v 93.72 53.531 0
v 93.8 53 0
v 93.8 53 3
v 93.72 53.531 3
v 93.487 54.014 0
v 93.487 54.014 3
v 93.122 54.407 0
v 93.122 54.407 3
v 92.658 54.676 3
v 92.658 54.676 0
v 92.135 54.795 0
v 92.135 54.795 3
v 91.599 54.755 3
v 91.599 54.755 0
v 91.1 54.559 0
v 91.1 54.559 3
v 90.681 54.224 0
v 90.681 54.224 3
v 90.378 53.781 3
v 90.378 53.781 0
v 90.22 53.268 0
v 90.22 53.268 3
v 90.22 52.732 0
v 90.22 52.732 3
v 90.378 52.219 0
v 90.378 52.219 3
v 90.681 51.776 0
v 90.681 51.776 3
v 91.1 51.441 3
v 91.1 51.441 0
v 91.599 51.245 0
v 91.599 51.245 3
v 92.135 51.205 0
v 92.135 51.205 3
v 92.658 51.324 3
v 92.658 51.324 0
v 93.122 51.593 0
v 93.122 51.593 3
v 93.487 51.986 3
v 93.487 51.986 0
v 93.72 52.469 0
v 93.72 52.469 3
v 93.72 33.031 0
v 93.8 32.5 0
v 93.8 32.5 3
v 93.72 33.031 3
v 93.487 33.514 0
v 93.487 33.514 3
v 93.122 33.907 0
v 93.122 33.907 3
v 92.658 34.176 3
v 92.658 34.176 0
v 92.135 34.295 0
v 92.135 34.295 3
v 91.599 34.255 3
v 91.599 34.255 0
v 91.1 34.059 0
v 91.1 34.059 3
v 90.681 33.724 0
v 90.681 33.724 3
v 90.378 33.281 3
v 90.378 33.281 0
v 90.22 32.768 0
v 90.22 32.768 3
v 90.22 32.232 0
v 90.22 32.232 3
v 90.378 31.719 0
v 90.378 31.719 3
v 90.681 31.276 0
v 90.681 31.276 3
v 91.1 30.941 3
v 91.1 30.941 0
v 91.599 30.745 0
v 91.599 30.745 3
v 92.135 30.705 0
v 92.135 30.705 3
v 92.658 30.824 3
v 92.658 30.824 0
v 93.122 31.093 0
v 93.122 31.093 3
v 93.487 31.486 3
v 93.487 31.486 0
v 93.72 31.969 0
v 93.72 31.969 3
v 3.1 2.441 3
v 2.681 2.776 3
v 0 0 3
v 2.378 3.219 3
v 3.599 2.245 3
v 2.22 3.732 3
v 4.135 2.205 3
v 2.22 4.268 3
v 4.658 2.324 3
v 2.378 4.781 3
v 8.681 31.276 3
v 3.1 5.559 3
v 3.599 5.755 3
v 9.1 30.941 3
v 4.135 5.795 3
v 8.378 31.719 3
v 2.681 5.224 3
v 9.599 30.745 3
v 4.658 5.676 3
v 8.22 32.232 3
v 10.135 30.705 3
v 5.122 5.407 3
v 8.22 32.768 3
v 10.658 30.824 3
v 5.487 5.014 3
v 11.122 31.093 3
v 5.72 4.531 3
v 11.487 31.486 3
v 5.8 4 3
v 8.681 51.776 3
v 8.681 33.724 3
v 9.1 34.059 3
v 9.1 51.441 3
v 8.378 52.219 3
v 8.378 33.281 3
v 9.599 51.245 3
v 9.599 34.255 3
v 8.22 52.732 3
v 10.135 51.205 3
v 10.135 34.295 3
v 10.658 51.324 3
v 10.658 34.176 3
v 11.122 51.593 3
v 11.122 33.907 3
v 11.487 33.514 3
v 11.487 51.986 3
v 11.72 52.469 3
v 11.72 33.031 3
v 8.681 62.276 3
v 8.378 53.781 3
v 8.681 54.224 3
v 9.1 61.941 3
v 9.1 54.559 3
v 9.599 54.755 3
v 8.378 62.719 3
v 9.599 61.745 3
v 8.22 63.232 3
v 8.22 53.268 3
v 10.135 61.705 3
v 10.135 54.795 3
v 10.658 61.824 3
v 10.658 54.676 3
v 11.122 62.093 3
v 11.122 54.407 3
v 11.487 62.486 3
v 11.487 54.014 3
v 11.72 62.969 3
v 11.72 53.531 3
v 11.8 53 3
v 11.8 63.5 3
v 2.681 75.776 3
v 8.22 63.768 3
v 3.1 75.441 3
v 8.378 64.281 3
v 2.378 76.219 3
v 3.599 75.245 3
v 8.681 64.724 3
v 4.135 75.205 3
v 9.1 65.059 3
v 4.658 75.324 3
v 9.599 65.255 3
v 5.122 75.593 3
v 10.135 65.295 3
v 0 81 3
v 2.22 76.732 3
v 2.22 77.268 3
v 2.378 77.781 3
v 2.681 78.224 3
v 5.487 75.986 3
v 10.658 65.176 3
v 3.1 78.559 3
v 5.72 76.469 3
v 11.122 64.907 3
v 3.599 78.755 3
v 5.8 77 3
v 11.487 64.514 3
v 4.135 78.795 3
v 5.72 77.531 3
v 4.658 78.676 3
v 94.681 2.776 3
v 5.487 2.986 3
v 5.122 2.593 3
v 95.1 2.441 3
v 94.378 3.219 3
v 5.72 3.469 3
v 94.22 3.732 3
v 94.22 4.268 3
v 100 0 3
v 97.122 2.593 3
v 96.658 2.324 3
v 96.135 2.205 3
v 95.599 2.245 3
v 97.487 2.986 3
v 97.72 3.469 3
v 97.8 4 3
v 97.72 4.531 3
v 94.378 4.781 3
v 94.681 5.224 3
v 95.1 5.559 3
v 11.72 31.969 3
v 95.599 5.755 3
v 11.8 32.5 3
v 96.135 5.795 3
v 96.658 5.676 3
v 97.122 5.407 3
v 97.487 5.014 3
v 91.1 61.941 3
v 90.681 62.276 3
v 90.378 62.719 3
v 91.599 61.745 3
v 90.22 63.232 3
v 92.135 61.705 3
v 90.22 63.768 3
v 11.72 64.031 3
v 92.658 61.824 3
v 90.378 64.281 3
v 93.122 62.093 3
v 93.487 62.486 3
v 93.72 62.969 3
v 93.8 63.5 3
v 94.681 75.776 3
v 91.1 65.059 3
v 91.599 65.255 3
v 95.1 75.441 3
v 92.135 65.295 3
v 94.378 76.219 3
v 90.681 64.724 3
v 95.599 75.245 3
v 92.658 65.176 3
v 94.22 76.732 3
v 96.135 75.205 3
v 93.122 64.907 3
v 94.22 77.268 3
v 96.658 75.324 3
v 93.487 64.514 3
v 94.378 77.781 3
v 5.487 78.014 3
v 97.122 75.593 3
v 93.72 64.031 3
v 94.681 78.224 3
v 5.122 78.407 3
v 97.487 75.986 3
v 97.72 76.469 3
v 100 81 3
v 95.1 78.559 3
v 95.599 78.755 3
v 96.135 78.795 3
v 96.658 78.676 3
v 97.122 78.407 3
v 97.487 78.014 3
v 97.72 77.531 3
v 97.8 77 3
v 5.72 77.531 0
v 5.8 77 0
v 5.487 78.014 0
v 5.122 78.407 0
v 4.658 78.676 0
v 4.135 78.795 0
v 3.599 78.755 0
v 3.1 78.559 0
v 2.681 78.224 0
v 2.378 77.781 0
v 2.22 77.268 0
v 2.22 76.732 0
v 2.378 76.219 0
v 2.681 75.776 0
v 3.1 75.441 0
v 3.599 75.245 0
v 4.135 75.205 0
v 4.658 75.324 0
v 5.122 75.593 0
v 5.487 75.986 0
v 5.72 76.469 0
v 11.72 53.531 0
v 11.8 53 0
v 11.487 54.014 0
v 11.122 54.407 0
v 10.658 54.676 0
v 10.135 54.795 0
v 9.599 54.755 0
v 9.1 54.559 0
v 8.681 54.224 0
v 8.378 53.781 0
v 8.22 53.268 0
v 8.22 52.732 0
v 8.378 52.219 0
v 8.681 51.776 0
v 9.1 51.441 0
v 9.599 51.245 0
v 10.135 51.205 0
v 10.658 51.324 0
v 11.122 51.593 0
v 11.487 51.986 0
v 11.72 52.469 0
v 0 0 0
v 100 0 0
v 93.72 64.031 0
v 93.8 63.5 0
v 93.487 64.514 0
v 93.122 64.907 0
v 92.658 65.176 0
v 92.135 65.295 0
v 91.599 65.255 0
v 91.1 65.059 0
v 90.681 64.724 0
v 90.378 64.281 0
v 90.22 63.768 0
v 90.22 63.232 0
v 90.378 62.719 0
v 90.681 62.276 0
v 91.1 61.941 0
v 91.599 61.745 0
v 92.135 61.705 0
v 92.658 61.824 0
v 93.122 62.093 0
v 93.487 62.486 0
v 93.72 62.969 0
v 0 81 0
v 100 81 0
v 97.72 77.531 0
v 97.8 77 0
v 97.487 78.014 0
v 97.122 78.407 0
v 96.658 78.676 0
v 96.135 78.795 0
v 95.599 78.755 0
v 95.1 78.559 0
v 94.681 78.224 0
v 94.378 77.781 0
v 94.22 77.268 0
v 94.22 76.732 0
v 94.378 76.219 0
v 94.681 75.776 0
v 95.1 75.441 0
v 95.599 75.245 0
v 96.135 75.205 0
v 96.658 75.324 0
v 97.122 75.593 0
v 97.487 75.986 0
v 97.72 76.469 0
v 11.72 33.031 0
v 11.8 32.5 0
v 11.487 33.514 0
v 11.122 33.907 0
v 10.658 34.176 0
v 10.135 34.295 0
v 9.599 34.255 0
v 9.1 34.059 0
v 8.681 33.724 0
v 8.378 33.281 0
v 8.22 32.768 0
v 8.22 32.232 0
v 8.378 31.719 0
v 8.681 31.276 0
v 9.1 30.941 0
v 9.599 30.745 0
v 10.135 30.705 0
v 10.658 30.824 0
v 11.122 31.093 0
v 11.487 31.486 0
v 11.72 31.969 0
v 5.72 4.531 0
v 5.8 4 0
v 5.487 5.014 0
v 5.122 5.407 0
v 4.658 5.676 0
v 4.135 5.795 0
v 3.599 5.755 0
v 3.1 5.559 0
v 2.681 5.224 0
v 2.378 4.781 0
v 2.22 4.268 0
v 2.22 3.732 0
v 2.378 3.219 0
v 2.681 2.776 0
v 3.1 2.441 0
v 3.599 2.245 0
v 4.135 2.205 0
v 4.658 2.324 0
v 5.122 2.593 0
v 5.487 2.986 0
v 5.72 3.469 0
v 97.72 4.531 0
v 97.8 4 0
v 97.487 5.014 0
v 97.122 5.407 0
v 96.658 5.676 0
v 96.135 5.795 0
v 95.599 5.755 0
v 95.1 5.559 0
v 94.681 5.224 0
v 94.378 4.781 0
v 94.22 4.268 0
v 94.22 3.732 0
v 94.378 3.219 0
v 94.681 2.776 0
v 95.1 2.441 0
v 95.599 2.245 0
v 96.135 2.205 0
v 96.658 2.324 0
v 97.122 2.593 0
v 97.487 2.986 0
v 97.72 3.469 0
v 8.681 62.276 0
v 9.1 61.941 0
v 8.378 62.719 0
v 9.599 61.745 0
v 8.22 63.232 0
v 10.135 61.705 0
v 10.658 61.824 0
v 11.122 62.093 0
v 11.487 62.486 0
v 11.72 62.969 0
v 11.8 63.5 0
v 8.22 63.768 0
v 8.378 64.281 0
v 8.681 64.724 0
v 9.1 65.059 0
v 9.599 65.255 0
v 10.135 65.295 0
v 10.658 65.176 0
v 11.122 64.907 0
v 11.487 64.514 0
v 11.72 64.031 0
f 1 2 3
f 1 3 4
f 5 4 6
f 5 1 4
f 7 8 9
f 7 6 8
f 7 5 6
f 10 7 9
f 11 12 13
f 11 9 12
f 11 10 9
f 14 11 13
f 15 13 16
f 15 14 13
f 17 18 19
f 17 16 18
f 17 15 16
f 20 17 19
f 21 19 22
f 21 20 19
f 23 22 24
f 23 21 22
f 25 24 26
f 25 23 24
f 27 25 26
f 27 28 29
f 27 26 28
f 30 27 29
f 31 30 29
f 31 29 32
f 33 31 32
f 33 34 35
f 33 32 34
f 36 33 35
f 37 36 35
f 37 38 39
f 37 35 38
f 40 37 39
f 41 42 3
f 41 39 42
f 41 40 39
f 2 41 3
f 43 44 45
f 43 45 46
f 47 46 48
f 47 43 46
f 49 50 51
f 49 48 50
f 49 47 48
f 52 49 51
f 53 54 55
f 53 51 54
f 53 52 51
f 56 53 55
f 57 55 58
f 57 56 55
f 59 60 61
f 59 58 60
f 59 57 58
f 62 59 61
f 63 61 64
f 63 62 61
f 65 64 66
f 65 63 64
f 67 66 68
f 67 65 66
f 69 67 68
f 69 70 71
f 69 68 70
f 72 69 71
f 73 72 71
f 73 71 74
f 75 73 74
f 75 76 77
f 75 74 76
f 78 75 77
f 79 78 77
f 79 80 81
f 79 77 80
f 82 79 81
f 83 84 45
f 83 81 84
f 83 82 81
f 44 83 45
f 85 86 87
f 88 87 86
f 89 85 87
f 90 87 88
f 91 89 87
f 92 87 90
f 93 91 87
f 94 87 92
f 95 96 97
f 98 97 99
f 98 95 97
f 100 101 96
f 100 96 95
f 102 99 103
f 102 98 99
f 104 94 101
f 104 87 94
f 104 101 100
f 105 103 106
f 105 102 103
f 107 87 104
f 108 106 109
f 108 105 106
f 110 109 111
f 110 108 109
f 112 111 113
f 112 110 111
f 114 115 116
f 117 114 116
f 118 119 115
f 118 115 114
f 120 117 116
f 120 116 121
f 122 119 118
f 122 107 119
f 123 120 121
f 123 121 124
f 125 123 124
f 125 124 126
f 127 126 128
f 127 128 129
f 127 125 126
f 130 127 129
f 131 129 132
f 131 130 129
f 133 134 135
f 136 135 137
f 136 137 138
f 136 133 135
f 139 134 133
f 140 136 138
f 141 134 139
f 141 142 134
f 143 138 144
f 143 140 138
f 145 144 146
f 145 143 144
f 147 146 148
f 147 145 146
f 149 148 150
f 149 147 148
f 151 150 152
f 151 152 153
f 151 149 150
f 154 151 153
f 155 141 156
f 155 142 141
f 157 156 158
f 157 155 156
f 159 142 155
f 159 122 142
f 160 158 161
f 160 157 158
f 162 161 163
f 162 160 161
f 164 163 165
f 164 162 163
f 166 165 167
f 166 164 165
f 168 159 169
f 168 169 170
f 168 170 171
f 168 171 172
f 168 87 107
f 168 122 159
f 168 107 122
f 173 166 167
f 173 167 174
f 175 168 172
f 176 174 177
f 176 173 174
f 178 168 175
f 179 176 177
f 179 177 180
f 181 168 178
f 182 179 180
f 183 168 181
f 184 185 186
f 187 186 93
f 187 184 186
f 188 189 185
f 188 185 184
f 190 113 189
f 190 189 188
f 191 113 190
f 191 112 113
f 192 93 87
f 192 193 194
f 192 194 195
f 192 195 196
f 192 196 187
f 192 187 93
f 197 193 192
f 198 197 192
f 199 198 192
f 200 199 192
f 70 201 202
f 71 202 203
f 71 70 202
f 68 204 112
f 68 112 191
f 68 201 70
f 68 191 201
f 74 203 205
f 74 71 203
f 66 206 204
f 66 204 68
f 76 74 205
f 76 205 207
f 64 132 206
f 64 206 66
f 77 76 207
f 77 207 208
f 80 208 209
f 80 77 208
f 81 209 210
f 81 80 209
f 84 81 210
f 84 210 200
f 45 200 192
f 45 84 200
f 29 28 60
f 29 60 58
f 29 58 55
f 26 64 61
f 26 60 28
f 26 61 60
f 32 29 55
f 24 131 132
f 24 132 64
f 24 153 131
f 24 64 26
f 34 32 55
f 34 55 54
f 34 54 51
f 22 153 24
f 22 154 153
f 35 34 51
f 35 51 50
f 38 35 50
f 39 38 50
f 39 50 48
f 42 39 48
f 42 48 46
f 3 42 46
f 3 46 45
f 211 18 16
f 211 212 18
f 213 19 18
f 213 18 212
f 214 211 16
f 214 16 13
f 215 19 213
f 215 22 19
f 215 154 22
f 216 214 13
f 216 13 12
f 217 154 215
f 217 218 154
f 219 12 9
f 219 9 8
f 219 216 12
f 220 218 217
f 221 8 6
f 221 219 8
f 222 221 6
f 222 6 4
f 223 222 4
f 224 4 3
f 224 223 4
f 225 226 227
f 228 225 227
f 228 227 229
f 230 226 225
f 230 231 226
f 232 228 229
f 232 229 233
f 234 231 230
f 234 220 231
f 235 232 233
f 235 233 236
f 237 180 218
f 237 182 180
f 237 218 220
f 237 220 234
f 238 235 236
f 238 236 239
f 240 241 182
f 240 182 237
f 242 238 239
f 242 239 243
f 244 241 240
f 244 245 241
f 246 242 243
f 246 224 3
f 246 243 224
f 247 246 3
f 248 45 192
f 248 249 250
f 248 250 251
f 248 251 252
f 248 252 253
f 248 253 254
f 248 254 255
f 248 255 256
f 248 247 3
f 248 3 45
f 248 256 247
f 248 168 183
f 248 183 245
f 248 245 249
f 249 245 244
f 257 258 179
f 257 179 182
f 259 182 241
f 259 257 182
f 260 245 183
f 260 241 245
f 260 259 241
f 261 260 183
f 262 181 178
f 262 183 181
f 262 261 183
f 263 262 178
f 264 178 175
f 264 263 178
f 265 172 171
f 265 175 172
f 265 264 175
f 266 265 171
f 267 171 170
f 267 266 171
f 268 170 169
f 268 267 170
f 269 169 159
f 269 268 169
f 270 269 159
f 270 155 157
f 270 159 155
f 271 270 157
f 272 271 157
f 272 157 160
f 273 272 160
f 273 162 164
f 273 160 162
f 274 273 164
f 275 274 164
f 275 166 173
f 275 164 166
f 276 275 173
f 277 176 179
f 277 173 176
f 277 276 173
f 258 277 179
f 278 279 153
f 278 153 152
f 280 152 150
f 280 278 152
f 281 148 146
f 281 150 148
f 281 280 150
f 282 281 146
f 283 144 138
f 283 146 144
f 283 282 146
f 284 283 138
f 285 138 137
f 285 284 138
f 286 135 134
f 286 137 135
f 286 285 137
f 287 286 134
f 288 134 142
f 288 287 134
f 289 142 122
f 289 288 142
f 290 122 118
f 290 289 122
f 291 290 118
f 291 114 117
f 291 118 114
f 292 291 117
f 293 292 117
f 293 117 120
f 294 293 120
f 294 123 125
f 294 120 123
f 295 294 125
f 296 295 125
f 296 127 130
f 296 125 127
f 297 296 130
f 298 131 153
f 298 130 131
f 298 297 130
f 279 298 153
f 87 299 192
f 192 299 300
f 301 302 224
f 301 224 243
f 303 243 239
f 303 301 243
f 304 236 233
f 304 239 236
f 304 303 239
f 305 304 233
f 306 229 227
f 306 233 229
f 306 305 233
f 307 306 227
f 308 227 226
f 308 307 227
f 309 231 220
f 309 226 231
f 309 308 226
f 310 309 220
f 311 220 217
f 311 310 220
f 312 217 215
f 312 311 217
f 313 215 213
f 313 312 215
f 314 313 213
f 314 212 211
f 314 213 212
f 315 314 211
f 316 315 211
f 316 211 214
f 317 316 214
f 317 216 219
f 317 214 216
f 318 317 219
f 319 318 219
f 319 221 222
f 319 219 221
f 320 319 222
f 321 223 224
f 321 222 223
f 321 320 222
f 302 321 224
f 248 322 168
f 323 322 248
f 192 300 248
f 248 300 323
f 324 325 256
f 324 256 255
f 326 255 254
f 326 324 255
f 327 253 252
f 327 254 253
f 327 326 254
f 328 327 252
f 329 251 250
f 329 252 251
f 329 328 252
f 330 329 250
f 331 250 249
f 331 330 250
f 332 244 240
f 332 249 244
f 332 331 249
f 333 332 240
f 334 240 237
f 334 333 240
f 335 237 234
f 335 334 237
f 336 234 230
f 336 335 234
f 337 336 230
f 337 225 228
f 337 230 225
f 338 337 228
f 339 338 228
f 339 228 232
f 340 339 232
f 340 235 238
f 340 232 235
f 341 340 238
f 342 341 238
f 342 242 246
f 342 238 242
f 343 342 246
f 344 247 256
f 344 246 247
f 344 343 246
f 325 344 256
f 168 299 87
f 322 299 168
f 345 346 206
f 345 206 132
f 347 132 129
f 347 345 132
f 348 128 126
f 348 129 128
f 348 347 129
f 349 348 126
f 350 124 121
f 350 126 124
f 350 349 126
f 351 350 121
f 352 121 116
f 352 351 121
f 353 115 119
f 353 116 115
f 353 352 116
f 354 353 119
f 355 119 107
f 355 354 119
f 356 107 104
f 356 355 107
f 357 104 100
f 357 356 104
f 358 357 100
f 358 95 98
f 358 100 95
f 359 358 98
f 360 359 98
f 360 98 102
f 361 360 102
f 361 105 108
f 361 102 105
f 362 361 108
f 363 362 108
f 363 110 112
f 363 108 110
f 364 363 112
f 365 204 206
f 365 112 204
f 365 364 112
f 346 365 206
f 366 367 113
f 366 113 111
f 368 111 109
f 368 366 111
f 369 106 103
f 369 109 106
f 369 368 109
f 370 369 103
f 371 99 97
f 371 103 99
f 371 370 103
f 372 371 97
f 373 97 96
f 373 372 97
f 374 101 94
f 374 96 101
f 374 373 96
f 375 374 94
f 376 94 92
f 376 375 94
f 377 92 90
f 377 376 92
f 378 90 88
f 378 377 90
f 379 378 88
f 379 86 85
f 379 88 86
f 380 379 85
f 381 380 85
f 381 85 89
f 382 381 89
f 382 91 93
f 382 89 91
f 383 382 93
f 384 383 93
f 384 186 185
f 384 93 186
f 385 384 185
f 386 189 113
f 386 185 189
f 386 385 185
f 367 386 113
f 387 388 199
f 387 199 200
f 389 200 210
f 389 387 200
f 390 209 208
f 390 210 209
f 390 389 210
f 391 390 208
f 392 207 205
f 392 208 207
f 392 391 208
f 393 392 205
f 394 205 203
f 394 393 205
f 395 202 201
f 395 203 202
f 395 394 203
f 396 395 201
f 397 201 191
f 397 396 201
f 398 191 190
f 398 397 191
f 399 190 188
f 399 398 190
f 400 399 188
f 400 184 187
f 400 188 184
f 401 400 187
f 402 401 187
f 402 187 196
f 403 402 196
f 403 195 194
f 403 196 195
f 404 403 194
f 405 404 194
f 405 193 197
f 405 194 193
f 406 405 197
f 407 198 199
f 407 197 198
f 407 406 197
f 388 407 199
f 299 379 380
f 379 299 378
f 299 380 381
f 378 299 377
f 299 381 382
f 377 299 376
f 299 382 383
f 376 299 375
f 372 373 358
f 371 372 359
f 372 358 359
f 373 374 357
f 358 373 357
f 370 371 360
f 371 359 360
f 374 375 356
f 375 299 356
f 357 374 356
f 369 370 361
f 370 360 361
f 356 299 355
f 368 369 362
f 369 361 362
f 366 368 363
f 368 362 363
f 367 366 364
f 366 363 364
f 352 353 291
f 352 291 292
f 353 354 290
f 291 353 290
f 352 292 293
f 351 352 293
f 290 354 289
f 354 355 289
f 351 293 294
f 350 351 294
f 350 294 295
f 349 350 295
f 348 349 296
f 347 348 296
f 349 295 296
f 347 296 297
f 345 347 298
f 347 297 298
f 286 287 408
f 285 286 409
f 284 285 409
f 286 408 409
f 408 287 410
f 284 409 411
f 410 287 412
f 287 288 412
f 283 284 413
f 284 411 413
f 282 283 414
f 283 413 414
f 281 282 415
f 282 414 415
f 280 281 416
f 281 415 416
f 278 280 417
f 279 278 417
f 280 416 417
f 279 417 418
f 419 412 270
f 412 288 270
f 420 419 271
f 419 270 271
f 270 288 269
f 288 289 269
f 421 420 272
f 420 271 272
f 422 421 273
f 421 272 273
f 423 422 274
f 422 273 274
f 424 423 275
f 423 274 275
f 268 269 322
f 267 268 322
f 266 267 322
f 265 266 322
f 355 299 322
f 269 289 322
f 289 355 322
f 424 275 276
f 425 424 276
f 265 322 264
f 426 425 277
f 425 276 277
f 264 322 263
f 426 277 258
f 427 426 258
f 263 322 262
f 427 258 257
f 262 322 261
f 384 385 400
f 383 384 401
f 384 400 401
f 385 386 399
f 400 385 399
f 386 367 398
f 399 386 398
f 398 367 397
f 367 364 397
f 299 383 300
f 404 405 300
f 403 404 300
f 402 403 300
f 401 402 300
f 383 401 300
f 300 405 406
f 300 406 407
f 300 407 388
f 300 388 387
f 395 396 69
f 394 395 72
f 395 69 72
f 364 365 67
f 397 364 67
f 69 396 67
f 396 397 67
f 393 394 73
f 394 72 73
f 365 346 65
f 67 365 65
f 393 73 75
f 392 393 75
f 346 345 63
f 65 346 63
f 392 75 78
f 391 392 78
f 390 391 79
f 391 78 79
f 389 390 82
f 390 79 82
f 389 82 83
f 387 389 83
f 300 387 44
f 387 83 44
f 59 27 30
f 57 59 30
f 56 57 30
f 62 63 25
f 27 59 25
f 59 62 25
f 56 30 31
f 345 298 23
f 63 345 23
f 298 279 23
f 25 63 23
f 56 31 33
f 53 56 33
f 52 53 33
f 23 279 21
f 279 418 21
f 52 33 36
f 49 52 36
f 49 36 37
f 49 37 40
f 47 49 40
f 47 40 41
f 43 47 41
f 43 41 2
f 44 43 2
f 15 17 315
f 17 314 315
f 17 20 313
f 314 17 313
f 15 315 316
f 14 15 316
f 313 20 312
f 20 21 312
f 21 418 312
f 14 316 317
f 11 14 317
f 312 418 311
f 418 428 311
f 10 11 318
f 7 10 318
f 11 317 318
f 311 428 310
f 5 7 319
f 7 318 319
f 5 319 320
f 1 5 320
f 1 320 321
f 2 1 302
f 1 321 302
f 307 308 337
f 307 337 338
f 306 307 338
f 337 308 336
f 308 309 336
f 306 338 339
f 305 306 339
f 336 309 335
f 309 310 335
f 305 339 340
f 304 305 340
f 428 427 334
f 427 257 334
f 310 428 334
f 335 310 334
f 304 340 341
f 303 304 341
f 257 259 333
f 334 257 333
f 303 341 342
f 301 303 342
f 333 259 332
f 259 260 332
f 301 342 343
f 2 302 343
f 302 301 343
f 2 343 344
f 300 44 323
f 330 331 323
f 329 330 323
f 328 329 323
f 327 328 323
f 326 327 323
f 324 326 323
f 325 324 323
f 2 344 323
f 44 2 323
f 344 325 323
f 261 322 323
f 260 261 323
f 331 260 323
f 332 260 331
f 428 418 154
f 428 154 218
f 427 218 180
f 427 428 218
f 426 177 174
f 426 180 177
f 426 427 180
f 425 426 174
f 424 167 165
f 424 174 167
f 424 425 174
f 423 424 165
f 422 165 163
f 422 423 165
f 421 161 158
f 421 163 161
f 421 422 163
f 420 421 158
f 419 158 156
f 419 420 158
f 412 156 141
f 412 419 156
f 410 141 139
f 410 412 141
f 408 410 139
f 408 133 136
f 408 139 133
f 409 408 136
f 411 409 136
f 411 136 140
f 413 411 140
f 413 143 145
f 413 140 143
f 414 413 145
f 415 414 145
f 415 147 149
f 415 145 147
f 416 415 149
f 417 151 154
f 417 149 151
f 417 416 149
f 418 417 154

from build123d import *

# Parameters (mm, degrees)
CYLINDER012_R     = 1.8
CYLINDER012_DEPTH = 20
ARRAY007_X_COUNT  = 2
ARRAY007_X_PITCH  = 92
ARRAY007_Y_COUNT  = 2
ARRAY007_Y_PITCH  = 73
CYLINDER013_R     = 1.8
CYLINDER013_DEPTH = 20
ARRAY008_X_COUNT  = 2
ARRAY008_X_PITCH  = 82
CYLINDER011_R     = 1.8
CYLINDER011_DEPTH = 20
ARRAY_X_COUNT     = 2
ARRAY_X_PITCH     = 82
ARRAY_Y_COUNT     = 2
ARRAY_Y_PITCH     = 31
BOX_W             = 100
BOX_H             = 81
BOX_DEPTH         = 3


with BuildPart() as corner_hole_array:
    # Cylinder012 → Cylinder012 (new body)
    with BuildSketch(Plane(origin=(4, 4, -6), x_dir=(1, 0, 0), z_dir=(0, 0, 1))):
        Circle(CYLINDER012_R)
    extrude(amount=CYLINDER012_DEPTH)

    # Array007 X: corner hole array ×2


with BuildPart() as corner_hole_array_1:
    add(corner_hole_array.part)
    with Locations(*[(i * ARRAY007_X_PITCH, 0, 0) for i in range(1, ARRAY007_X_COUNT)]):
        add(corner_hole_array.part)

    # Array007 Y: corner hole array ×2


with BuildPart() as corner_hole_array_2:
    add(corner_hole_array_1.part)
    with Locations(*[(0, i * ARRAY007_Y_PITCH, 0) for i in range(1, ARRAY007_Y_COUNT)]):
        add(corner_hole_array_1.part)


with BuildPart() as screw_hole_array:
    # Cylinder013 → Cylinder013 (new body)
    with BuildSketch(Plane(origin=(10, 53, -6), x_dir=(1, 0, 0), z_dir=(0, 0, 1))):
        Circle(CYLINDER013_R)
    extrude(amount=CYLINDER013_DEPTH)

    # Array008 X: screw hole array ×2


with BuildPart() as screw_hole_array_1:
    add(screw_hole_array.part)
    with Locations(*[(i * ARRAY008_X_PITCH, 0, 0) for i in range(1, ARRAY008_X_COUNT)]):
        add(screw_hole_array.part)


with BuildPart() as hole_fusion:
    # Cylinder011 → Cylinder011 (new body)
    with BuildSketch(Plane(origin=(10, 32.5, -6), x_dir=(1, 0, 0), z_dir=(0, 0, 1))):
        Circle(CYLINDER011_R)
    extrude(amount=CYLINDER011_DEPTH)

    # Array X: hole fusion ×2


with BuildPart() as hole_fusion_1:
    add(hole_fusion.part)
    with Locations(*[(i * ARRAY_X_PITCH, 0, 0) for i in range(1, ARRAY_X_COUNT)]):
        add(hole_fusion.part)

    # Array Y: hole fusion ×2


with BuildPart() as hole_fusion_2:
    add(hole_fusion_1.part)
    with Locations(*[(0, i * ARRAY_Y_PITCH, 0) for i in range(1, ARRAY_Y_COUNT)]):
        add(hole_fusion_1.part)

    # Fusion: union corner hole array, screw hole array
    add(corner_hole_array_2.part)
    add(screw_hole_array_1.part)


with BuildPart() as bottom_part_cut:
    # Box → Box (new body)
    with BuildSketch(Plane.XY):
        with Locations((50, 40.5)):
            Rectangle(BOX_W, BOX_H)
    extrude(amount=BOX_DEPTH)

    # Cut008: cut hole fusion
    add(hole_fusion_2.part, mode=Mode.SUBTRACT)


solid = bottom_part_cut.part
